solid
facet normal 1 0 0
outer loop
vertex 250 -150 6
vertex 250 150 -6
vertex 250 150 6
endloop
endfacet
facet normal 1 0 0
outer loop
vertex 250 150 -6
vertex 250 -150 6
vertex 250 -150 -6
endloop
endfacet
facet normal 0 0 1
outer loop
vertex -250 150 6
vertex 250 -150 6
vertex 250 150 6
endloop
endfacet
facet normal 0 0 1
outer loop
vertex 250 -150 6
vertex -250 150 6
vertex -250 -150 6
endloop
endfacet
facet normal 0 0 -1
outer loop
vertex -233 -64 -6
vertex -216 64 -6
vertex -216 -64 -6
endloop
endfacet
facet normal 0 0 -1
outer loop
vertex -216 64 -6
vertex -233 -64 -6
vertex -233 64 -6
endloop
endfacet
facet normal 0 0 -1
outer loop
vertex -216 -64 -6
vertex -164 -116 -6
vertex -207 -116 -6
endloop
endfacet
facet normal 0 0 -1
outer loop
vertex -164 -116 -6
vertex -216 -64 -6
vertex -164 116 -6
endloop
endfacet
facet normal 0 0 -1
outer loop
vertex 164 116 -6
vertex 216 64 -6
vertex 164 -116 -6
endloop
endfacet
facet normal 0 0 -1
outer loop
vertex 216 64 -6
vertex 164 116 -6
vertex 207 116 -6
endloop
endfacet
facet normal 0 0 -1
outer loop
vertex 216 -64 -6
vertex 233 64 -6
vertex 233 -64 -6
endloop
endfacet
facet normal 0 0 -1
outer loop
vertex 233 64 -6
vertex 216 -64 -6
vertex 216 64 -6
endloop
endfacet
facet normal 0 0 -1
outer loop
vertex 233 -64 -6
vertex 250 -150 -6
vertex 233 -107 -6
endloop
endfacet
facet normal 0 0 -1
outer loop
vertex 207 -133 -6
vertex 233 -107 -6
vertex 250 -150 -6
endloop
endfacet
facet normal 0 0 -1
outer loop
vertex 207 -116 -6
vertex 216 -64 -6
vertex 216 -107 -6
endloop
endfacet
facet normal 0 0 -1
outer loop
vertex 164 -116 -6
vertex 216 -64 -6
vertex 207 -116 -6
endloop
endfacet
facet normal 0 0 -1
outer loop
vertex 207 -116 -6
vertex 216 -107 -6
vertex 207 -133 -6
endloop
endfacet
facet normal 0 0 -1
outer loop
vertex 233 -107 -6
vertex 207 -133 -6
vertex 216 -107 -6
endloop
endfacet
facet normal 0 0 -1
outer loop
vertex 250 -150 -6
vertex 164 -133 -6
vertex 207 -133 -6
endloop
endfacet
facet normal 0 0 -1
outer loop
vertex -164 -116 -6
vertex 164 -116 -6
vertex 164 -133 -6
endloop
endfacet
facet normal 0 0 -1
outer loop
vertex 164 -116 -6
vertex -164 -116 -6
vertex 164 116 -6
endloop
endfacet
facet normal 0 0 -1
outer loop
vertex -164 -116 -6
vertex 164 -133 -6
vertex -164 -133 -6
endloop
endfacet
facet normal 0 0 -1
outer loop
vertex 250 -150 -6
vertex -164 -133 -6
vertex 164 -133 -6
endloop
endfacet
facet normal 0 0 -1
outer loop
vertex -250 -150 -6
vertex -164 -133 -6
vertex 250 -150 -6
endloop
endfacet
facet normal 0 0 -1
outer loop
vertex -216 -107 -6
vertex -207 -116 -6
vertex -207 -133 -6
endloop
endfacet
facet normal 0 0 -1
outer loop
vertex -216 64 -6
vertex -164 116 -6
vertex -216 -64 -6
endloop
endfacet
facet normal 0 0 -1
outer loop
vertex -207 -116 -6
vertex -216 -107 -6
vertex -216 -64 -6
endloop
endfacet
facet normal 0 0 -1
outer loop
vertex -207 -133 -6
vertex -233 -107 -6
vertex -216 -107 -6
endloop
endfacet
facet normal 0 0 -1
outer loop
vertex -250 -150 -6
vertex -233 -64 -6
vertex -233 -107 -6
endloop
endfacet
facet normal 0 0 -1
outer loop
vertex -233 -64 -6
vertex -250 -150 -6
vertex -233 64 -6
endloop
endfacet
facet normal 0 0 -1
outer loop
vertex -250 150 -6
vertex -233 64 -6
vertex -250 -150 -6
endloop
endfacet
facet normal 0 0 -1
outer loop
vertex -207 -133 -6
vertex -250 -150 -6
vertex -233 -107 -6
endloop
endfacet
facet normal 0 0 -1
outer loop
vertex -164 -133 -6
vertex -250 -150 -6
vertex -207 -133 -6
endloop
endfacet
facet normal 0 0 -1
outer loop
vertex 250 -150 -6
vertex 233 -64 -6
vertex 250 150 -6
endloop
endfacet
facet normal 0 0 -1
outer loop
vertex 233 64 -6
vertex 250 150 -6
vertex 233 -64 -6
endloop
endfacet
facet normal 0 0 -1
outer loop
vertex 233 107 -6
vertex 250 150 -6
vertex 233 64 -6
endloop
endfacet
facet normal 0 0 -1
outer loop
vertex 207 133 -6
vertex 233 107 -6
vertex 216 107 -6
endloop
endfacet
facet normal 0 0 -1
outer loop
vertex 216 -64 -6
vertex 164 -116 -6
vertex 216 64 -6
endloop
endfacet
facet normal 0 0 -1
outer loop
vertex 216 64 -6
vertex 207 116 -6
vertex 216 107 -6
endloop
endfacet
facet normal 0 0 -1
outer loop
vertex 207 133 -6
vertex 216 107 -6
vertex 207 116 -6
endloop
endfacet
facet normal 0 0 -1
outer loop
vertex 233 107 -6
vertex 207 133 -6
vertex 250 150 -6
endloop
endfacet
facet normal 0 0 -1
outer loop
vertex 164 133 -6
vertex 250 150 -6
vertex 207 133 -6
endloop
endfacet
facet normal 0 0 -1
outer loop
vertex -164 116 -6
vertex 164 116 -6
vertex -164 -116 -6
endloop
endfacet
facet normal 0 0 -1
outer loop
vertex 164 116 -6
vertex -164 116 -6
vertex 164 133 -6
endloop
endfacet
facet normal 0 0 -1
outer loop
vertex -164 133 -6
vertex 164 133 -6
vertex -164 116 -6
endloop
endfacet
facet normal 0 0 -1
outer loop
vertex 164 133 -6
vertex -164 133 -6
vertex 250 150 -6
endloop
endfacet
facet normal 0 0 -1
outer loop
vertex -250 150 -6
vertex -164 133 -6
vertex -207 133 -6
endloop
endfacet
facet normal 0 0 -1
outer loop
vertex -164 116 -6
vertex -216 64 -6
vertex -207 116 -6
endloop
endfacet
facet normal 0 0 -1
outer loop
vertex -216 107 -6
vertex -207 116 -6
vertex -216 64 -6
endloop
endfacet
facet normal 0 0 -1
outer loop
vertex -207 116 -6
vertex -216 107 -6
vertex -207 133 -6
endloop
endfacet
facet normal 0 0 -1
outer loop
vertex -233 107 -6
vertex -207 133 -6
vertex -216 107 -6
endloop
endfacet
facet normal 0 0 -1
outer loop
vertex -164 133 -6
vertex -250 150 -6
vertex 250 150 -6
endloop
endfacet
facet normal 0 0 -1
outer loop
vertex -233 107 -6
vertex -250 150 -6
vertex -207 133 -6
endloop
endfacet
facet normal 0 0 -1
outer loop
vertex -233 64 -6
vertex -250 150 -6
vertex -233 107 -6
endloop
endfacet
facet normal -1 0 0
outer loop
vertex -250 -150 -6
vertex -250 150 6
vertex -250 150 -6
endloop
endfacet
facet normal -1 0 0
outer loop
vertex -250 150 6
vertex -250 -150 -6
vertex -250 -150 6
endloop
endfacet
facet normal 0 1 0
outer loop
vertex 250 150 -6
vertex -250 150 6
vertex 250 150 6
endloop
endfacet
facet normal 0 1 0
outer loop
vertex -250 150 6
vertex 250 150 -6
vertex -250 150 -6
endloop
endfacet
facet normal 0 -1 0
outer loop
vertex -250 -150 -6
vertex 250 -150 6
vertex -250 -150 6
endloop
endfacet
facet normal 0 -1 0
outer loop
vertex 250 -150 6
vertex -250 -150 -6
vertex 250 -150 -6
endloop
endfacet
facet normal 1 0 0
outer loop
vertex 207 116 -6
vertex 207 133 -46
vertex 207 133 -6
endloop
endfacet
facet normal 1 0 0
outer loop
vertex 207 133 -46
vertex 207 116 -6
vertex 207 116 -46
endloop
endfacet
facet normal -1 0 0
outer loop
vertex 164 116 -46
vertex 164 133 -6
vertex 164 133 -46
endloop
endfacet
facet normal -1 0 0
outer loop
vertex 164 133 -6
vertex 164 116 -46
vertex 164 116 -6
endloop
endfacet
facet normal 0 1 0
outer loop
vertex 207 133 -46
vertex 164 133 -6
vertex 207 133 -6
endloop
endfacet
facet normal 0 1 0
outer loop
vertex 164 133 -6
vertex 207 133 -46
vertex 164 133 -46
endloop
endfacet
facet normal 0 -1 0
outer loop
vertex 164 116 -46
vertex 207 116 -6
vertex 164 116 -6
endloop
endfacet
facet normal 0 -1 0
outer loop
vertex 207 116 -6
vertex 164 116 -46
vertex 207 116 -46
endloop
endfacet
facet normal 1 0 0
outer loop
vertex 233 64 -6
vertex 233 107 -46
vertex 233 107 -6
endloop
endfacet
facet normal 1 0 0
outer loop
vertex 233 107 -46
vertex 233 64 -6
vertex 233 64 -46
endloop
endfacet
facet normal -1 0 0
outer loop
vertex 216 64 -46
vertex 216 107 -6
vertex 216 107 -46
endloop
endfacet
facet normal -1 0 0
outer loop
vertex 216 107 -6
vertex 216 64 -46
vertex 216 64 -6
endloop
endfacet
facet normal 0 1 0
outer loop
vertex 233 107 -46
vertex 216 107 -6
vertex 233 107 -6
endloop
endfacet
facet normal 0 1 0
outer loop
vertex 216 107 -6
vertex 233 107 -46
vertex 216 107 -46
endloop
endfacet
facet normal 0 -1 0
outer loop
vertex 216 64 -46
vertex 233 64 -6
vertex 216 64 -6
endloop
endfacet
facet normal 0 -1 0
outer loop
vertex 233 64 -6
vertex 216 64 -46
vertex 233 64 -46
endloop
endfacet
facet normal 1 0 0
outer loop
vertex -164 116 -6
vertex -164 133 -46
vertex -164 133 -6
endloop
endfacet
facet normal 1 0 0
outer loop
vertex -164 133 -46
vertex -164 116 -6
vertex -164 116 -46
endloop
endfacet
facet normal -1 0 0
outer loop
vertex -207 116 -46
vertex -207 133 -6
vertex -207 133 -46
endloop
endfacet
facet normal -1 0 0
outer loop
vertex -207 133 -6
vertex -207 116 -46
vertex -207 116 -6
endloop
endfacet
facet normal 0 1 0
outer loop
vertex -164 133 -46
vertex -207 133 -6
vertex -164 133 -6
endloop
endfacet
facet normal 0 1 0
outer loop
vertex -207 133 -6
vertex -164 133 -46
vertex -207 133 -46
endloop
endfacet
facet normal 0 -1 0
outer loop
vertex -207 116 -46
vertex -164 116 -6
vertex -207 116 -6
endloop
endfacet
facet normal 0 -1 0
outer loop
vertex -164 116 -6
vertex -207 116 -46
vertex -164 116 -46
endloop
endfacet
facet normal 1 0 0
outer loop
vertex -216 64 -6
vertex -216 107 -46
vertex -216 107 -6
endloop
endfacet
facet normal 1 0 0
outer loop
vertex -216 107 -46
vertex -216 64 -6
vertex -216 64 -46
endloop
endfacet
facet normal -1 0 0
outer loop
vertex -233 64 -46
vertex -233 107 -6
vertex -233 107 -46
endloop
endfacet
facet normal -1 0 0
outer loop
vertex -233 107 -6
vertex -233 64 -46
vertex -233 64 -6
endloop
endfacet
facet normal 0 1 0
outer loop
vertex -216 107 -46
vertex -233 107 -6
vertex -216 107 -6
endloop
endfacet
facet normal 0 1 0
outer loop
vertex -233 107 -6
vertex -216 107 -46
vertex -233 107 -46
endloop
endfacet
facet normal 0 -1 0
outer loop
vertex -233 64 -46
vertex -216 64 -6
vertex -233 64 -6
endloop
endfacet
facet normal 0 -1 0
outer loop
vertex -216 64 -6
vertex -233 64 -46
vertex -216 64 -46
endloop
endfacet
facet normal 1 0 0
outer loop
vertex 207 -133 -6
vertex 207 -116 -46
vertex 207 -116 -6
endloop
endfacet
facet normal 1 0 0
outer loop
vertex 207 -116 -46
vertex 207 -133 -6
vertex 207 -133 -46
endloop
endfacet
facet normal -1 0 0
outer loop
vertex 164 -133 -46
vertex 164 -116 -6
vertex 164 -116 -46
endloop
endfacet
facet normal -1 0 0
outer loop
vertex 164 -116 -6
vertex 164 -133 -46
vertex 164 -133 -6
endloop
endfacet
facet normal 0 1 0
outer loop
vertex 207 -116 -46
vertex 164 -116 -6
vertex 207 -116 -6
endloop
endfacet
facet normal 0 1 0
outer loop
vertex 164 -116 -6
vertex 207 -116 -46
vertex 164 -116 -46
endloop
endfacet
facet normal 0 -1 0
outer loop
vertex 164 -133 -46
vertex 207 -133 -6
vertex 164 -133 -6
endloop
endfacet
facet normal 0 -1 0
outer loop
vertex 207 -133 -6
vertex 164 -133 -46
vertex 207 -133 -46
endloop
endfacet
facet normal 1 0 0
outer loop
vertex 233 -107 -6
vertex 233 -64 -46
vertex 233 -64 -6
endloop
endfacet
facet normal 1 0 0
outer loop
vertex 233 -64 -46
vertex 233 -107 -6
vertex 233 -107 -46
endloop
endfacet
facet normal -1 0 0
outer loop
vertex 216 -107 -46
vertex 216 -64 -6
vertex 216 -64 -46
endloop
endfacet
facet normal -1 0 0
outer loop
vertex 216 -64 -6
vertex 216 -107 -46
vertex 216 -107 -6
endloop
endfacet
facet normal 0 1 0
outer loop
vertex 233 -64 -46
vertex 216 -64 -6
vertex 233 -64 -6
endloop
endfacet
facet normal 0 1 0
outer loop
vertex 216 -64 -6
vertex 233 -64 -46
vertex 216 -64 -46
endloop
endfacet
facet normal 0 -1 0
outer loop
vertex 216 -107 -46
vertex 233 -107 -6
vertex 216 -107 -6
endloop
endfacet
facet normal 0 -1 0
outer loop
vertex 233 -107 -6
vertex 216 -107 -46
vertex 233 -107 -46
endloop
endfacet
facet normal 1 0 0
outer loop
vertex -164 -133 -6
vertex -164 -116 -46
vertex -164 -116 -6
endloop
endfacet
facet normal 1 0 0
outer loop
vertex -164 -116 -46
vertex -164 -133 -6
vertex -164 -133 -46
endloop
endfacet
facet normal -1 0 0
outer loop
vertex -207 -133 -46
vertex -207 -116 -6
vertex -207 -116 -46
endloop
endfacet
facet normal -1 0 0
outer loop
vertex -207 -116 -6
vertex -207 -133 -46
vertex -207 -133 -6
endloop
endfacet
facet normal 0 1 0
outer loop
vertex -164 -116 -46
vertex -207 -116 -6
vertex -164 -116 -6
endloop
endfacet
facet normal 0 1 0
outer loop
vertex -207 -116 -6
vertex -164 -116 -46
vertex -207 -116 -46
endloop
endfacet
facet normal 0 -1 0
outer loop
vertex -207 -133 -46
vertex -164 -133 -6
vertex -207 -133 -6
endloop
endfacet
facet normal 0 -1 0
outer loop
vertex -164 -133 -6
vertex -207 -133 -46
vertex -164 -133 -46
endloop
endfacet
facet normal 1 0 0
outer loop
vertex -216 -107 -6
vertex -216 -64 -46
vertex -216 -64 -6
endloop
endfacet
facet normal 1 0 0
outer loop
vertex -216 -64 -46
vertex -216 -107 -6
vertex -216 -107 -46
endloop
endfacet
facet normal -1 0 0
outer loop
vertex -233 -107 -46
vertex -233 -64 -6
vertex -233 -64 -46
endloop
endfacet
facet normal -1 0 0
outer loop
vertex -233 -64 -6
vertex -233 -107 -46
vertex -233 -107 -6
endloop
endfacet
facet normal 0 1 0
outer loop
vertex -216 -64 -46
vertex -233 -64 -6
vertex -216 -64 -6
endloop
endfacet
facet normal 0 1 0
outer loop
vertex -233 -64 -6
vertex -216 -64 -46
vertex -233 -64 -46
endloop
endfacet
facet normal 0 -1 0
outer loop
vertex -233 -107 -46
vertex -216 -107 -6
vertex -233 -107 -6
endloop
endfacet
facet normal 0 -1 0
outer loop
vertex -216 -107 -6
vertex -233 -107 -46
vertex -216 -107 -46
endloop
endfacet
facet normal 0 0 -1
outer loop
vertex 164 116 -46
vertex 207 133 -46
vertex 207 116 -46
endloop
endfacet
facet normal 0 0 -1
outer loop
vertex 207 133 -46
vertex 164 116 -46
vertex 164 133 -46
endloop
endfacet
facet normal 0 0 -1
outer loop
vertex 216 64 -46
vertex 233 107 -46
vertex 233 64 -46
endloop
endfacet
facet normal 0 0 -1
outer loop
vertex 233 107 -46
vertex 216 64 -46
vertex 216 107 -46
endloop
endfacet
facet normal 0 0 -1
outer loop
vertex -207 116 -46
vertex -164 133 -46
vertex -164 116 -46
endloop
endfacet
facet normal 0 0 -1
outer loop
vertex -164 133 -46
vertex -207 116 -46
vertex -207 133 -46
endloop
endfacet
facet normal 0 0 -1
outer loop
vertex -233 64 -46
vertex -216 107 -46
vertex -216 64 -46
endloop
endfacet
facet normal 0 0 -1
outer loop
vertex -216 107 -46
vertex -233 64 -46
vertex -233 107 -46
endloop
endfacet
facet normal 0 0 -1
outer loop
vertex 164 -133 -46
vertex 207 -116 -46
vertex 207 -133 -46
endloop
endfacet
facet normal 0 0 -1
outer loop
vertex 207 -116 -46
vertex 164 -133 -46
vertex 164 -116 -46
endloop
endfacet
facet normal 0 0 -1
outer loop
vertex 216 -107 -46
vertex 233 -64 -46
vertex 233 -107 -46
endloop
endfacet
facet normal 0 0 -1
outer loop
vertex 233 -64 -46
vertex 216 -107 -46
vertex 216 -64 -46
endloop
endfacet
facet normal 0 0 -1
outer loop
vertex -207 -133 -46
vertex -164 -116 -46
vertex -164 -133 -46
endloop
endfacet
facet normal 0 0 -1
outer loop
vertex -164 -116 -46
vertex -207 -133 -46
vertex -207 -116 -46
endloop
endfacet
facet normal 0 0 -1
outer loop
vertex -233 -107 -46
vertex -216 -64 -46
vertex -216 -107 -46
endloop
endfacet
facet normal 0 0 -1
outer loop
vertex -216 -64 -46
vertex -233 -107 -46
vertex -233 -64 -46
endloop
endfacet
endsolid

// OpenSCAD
module top(table_width,table_depth,shelf_thickness,strut_timber_width,strut_timber_depth,leg_timber_width, lap_depth,brace_length)
{
     difference()
     {
	  cube([table_width,table_depth,shelf_thickness],true);
	  //Back Right - x-parallel
	  translate([table_width/2 - brace_length/2 - leg_timber_width,
		     table_depth/2 - strut_timber_depth/2 - strut_timber_depth,
		     -shelf_thickness/2 + shelf_thickness/4/2])
	  {
	       cube([brace_length,strut_timber_depth,shelf_thickness/4],true);
	  }
			
	  //Back right y-parallel
	  translate([table_width/2 - strut_timber_depth/2 - strut_timber_depth,
		     table_depth/2 - brace_length/2 - leg_timber_width,
		     -shelf_thickness/2 + shelf_thickness/4/2])
	  {
	       cube([strut_timber_depth,brace_length,shelf_thickness/4],true);
	  }
			
			
	  //Back Left - x-parallel
	  translate([(table_width/2 - brace_length/2 - leg_timber_width)*-1,
		     table_depth/2 - strut_timber_depth/2 - strut_timber_depth,
		     -shelf_thickness/2 + shelf_thickness/4/2])
	  {
	       cube([brace_length,strut_timber_depth,shelf_thickness/4],true);
	  }
			
	  //Back Left y-parallel
	  translate([(table_width/2 - strut_timber_depth/2 - strut_timber_depth)*-1,
		     table_depth/2 - brace_length/2 - leg_timber_width,
		     -shelf_thickness/2 + shelf_thickness/4/2])
	  {
	       cube([strut_timber_depth,brace_length,shelf_thickness/4],true);
	  }
			
			
	  //Front Right - x-parallel
	  translate([table_width/2 - brace_length/2 - leg_timber_width,
		     (table_depth/2 - strut_timber_depth/2 - strut_timber_depth)*-1,
		     -shelf_thickness/2 + shelf_thickness/4/2])
	  {
	       cube([brace_length,strut_timber_depth,shelf_thickness/4],true);
	  }
			
	  //Back right y-parallel
	  translate([table_width/2 - strut_timber_depth/2 - strut_timber_depth,
		     (table_depth/2 - brace_length/2 - leg_timber_width)*-1,
		     -shelf_thickness/2 + shelf_thickness/4/2])
	  {
	       cube([strut_timber_depth,brace_length,shelf_thickness/4],true);
	  }
			
			
	  //Front Left - x-parallel
	  translate([(table_width/2 - brace_length/2 - leg_timber_width)*-1,
		     (table_depth/2 - strut_timber_depth/2 - strut_timber_depth)*-1,
		     -shelf_thickness/2 + shelf_thickness/4/2])
	  {
	       cube([brace_length,strut_timber_depth,shelf_thickness/4],true);
	  }
			
	  //Front Left y-parallel
	  translate([(table_width/2 - strut_timber_depth/2 - strut_timber_depth)*-1,
		     (table_depth/2 - brace_length/2 - leg_timber_width)*-1,
		     -shelf_thickness/2 + shelf_thickness/4/2])
	  {
	       cube([strut_timber_depth,brace_length,shelf_thickness/4],true);
	  }

     }
		
     //Back Right x-parallel
     translate([table_width/2 - brace_length/2 - leg_timber_width,
		table_depth/2 - strut_timber_depth/2 - strut_timber_depth,
		-strut_timber_width/2-shelf_thickness/4])
     {
	  cube([brace_length,strut_timber_depth,strut_timber_width],true);
     }
		
     // Back right y-parallel
     translate([table_width/2 - strut_timber_depth/2 - strut_timber_depth,
		table_depth/2 - brace_length/2 - leg_timber_width,
		-strut_timber_width/2-shelf_thickness/4])
     {
	  cube([strut_timber_depth,brace_length,strut_timber_width],true);
     }
		
     //Back Left x-parallel
     translate([(table_width/2 - brace_length/2 - leg_timber_width)*-1,
		table_depth/2 - strut_timber_depth/2 - strut_timber_depth,
		-strut_timber_width/2-shelf_thickness/4])
     {
	  cube([brace_length,strut_timber_depth,strut_timber_width],true);
     }
		
     // Back Left y-parallel
     translate([(table_width/2 - strut_timber_depth/2 - strut_timber_depth)*-1,
		table_depth/2 - brace_length/2 - leg_timber_width,
		-strut_timber_width/2-shelf_thickness/4])
     {
	  cube([strut_timber_depth,brace_length,strut_timber_width],true);
     }
		
		
     //Front Right x-parallel
     translate([table_width/2 - brace_length/2 - leg_timber_width,
		(table_depth/2 - strut_timber_depth/2 - strut_timber_depth)*-1,
		-strut_timber_width/2-shelf_thickness/4])
     {
	  cube([brace_length,strut_timber_depth,strut_timber_width],true);
     }
		
     // Front right y-parallel
     translate([table_width/2 - strut_timber_depth/2 - strut_timber_depth,
		(table_depth/2 - brace_length/2 - leg_timber_width)*-1,
		-strut_timber_width/2-shelf_thickness/4])
     {
	  cube([strut_timber_depth,brace_length,strut_timber_width],true);
     }
		
     //Front Left x-parallel
     translate([(table_width/2 - brace_length/2 - leg_timber_width)*-1,
		(table_depth/2 - strut_timber_depth/2 - strut_timber_depth)*-1,
		-strut_timber_width/2-shelf_thickness/4])
     {
	  cube([brace_length,strut_timber_depth,strut_timber_width],true);
     }
		
     //Front Left y-parallel
     translate([(table_width/2 - strut_timber_depth/2 - strut_timber_depth)*-1,
		(table_depth/2 - brace_length/2 - leg_timber_width)*-1,
		-strut_timber_width/2-shelf_thickness/4])
     {
	  cube([strut_timber_depth,brace_length,strut_timber_width],true);
     }
     
}
top(500,300,12,43,17,43,15,43);
